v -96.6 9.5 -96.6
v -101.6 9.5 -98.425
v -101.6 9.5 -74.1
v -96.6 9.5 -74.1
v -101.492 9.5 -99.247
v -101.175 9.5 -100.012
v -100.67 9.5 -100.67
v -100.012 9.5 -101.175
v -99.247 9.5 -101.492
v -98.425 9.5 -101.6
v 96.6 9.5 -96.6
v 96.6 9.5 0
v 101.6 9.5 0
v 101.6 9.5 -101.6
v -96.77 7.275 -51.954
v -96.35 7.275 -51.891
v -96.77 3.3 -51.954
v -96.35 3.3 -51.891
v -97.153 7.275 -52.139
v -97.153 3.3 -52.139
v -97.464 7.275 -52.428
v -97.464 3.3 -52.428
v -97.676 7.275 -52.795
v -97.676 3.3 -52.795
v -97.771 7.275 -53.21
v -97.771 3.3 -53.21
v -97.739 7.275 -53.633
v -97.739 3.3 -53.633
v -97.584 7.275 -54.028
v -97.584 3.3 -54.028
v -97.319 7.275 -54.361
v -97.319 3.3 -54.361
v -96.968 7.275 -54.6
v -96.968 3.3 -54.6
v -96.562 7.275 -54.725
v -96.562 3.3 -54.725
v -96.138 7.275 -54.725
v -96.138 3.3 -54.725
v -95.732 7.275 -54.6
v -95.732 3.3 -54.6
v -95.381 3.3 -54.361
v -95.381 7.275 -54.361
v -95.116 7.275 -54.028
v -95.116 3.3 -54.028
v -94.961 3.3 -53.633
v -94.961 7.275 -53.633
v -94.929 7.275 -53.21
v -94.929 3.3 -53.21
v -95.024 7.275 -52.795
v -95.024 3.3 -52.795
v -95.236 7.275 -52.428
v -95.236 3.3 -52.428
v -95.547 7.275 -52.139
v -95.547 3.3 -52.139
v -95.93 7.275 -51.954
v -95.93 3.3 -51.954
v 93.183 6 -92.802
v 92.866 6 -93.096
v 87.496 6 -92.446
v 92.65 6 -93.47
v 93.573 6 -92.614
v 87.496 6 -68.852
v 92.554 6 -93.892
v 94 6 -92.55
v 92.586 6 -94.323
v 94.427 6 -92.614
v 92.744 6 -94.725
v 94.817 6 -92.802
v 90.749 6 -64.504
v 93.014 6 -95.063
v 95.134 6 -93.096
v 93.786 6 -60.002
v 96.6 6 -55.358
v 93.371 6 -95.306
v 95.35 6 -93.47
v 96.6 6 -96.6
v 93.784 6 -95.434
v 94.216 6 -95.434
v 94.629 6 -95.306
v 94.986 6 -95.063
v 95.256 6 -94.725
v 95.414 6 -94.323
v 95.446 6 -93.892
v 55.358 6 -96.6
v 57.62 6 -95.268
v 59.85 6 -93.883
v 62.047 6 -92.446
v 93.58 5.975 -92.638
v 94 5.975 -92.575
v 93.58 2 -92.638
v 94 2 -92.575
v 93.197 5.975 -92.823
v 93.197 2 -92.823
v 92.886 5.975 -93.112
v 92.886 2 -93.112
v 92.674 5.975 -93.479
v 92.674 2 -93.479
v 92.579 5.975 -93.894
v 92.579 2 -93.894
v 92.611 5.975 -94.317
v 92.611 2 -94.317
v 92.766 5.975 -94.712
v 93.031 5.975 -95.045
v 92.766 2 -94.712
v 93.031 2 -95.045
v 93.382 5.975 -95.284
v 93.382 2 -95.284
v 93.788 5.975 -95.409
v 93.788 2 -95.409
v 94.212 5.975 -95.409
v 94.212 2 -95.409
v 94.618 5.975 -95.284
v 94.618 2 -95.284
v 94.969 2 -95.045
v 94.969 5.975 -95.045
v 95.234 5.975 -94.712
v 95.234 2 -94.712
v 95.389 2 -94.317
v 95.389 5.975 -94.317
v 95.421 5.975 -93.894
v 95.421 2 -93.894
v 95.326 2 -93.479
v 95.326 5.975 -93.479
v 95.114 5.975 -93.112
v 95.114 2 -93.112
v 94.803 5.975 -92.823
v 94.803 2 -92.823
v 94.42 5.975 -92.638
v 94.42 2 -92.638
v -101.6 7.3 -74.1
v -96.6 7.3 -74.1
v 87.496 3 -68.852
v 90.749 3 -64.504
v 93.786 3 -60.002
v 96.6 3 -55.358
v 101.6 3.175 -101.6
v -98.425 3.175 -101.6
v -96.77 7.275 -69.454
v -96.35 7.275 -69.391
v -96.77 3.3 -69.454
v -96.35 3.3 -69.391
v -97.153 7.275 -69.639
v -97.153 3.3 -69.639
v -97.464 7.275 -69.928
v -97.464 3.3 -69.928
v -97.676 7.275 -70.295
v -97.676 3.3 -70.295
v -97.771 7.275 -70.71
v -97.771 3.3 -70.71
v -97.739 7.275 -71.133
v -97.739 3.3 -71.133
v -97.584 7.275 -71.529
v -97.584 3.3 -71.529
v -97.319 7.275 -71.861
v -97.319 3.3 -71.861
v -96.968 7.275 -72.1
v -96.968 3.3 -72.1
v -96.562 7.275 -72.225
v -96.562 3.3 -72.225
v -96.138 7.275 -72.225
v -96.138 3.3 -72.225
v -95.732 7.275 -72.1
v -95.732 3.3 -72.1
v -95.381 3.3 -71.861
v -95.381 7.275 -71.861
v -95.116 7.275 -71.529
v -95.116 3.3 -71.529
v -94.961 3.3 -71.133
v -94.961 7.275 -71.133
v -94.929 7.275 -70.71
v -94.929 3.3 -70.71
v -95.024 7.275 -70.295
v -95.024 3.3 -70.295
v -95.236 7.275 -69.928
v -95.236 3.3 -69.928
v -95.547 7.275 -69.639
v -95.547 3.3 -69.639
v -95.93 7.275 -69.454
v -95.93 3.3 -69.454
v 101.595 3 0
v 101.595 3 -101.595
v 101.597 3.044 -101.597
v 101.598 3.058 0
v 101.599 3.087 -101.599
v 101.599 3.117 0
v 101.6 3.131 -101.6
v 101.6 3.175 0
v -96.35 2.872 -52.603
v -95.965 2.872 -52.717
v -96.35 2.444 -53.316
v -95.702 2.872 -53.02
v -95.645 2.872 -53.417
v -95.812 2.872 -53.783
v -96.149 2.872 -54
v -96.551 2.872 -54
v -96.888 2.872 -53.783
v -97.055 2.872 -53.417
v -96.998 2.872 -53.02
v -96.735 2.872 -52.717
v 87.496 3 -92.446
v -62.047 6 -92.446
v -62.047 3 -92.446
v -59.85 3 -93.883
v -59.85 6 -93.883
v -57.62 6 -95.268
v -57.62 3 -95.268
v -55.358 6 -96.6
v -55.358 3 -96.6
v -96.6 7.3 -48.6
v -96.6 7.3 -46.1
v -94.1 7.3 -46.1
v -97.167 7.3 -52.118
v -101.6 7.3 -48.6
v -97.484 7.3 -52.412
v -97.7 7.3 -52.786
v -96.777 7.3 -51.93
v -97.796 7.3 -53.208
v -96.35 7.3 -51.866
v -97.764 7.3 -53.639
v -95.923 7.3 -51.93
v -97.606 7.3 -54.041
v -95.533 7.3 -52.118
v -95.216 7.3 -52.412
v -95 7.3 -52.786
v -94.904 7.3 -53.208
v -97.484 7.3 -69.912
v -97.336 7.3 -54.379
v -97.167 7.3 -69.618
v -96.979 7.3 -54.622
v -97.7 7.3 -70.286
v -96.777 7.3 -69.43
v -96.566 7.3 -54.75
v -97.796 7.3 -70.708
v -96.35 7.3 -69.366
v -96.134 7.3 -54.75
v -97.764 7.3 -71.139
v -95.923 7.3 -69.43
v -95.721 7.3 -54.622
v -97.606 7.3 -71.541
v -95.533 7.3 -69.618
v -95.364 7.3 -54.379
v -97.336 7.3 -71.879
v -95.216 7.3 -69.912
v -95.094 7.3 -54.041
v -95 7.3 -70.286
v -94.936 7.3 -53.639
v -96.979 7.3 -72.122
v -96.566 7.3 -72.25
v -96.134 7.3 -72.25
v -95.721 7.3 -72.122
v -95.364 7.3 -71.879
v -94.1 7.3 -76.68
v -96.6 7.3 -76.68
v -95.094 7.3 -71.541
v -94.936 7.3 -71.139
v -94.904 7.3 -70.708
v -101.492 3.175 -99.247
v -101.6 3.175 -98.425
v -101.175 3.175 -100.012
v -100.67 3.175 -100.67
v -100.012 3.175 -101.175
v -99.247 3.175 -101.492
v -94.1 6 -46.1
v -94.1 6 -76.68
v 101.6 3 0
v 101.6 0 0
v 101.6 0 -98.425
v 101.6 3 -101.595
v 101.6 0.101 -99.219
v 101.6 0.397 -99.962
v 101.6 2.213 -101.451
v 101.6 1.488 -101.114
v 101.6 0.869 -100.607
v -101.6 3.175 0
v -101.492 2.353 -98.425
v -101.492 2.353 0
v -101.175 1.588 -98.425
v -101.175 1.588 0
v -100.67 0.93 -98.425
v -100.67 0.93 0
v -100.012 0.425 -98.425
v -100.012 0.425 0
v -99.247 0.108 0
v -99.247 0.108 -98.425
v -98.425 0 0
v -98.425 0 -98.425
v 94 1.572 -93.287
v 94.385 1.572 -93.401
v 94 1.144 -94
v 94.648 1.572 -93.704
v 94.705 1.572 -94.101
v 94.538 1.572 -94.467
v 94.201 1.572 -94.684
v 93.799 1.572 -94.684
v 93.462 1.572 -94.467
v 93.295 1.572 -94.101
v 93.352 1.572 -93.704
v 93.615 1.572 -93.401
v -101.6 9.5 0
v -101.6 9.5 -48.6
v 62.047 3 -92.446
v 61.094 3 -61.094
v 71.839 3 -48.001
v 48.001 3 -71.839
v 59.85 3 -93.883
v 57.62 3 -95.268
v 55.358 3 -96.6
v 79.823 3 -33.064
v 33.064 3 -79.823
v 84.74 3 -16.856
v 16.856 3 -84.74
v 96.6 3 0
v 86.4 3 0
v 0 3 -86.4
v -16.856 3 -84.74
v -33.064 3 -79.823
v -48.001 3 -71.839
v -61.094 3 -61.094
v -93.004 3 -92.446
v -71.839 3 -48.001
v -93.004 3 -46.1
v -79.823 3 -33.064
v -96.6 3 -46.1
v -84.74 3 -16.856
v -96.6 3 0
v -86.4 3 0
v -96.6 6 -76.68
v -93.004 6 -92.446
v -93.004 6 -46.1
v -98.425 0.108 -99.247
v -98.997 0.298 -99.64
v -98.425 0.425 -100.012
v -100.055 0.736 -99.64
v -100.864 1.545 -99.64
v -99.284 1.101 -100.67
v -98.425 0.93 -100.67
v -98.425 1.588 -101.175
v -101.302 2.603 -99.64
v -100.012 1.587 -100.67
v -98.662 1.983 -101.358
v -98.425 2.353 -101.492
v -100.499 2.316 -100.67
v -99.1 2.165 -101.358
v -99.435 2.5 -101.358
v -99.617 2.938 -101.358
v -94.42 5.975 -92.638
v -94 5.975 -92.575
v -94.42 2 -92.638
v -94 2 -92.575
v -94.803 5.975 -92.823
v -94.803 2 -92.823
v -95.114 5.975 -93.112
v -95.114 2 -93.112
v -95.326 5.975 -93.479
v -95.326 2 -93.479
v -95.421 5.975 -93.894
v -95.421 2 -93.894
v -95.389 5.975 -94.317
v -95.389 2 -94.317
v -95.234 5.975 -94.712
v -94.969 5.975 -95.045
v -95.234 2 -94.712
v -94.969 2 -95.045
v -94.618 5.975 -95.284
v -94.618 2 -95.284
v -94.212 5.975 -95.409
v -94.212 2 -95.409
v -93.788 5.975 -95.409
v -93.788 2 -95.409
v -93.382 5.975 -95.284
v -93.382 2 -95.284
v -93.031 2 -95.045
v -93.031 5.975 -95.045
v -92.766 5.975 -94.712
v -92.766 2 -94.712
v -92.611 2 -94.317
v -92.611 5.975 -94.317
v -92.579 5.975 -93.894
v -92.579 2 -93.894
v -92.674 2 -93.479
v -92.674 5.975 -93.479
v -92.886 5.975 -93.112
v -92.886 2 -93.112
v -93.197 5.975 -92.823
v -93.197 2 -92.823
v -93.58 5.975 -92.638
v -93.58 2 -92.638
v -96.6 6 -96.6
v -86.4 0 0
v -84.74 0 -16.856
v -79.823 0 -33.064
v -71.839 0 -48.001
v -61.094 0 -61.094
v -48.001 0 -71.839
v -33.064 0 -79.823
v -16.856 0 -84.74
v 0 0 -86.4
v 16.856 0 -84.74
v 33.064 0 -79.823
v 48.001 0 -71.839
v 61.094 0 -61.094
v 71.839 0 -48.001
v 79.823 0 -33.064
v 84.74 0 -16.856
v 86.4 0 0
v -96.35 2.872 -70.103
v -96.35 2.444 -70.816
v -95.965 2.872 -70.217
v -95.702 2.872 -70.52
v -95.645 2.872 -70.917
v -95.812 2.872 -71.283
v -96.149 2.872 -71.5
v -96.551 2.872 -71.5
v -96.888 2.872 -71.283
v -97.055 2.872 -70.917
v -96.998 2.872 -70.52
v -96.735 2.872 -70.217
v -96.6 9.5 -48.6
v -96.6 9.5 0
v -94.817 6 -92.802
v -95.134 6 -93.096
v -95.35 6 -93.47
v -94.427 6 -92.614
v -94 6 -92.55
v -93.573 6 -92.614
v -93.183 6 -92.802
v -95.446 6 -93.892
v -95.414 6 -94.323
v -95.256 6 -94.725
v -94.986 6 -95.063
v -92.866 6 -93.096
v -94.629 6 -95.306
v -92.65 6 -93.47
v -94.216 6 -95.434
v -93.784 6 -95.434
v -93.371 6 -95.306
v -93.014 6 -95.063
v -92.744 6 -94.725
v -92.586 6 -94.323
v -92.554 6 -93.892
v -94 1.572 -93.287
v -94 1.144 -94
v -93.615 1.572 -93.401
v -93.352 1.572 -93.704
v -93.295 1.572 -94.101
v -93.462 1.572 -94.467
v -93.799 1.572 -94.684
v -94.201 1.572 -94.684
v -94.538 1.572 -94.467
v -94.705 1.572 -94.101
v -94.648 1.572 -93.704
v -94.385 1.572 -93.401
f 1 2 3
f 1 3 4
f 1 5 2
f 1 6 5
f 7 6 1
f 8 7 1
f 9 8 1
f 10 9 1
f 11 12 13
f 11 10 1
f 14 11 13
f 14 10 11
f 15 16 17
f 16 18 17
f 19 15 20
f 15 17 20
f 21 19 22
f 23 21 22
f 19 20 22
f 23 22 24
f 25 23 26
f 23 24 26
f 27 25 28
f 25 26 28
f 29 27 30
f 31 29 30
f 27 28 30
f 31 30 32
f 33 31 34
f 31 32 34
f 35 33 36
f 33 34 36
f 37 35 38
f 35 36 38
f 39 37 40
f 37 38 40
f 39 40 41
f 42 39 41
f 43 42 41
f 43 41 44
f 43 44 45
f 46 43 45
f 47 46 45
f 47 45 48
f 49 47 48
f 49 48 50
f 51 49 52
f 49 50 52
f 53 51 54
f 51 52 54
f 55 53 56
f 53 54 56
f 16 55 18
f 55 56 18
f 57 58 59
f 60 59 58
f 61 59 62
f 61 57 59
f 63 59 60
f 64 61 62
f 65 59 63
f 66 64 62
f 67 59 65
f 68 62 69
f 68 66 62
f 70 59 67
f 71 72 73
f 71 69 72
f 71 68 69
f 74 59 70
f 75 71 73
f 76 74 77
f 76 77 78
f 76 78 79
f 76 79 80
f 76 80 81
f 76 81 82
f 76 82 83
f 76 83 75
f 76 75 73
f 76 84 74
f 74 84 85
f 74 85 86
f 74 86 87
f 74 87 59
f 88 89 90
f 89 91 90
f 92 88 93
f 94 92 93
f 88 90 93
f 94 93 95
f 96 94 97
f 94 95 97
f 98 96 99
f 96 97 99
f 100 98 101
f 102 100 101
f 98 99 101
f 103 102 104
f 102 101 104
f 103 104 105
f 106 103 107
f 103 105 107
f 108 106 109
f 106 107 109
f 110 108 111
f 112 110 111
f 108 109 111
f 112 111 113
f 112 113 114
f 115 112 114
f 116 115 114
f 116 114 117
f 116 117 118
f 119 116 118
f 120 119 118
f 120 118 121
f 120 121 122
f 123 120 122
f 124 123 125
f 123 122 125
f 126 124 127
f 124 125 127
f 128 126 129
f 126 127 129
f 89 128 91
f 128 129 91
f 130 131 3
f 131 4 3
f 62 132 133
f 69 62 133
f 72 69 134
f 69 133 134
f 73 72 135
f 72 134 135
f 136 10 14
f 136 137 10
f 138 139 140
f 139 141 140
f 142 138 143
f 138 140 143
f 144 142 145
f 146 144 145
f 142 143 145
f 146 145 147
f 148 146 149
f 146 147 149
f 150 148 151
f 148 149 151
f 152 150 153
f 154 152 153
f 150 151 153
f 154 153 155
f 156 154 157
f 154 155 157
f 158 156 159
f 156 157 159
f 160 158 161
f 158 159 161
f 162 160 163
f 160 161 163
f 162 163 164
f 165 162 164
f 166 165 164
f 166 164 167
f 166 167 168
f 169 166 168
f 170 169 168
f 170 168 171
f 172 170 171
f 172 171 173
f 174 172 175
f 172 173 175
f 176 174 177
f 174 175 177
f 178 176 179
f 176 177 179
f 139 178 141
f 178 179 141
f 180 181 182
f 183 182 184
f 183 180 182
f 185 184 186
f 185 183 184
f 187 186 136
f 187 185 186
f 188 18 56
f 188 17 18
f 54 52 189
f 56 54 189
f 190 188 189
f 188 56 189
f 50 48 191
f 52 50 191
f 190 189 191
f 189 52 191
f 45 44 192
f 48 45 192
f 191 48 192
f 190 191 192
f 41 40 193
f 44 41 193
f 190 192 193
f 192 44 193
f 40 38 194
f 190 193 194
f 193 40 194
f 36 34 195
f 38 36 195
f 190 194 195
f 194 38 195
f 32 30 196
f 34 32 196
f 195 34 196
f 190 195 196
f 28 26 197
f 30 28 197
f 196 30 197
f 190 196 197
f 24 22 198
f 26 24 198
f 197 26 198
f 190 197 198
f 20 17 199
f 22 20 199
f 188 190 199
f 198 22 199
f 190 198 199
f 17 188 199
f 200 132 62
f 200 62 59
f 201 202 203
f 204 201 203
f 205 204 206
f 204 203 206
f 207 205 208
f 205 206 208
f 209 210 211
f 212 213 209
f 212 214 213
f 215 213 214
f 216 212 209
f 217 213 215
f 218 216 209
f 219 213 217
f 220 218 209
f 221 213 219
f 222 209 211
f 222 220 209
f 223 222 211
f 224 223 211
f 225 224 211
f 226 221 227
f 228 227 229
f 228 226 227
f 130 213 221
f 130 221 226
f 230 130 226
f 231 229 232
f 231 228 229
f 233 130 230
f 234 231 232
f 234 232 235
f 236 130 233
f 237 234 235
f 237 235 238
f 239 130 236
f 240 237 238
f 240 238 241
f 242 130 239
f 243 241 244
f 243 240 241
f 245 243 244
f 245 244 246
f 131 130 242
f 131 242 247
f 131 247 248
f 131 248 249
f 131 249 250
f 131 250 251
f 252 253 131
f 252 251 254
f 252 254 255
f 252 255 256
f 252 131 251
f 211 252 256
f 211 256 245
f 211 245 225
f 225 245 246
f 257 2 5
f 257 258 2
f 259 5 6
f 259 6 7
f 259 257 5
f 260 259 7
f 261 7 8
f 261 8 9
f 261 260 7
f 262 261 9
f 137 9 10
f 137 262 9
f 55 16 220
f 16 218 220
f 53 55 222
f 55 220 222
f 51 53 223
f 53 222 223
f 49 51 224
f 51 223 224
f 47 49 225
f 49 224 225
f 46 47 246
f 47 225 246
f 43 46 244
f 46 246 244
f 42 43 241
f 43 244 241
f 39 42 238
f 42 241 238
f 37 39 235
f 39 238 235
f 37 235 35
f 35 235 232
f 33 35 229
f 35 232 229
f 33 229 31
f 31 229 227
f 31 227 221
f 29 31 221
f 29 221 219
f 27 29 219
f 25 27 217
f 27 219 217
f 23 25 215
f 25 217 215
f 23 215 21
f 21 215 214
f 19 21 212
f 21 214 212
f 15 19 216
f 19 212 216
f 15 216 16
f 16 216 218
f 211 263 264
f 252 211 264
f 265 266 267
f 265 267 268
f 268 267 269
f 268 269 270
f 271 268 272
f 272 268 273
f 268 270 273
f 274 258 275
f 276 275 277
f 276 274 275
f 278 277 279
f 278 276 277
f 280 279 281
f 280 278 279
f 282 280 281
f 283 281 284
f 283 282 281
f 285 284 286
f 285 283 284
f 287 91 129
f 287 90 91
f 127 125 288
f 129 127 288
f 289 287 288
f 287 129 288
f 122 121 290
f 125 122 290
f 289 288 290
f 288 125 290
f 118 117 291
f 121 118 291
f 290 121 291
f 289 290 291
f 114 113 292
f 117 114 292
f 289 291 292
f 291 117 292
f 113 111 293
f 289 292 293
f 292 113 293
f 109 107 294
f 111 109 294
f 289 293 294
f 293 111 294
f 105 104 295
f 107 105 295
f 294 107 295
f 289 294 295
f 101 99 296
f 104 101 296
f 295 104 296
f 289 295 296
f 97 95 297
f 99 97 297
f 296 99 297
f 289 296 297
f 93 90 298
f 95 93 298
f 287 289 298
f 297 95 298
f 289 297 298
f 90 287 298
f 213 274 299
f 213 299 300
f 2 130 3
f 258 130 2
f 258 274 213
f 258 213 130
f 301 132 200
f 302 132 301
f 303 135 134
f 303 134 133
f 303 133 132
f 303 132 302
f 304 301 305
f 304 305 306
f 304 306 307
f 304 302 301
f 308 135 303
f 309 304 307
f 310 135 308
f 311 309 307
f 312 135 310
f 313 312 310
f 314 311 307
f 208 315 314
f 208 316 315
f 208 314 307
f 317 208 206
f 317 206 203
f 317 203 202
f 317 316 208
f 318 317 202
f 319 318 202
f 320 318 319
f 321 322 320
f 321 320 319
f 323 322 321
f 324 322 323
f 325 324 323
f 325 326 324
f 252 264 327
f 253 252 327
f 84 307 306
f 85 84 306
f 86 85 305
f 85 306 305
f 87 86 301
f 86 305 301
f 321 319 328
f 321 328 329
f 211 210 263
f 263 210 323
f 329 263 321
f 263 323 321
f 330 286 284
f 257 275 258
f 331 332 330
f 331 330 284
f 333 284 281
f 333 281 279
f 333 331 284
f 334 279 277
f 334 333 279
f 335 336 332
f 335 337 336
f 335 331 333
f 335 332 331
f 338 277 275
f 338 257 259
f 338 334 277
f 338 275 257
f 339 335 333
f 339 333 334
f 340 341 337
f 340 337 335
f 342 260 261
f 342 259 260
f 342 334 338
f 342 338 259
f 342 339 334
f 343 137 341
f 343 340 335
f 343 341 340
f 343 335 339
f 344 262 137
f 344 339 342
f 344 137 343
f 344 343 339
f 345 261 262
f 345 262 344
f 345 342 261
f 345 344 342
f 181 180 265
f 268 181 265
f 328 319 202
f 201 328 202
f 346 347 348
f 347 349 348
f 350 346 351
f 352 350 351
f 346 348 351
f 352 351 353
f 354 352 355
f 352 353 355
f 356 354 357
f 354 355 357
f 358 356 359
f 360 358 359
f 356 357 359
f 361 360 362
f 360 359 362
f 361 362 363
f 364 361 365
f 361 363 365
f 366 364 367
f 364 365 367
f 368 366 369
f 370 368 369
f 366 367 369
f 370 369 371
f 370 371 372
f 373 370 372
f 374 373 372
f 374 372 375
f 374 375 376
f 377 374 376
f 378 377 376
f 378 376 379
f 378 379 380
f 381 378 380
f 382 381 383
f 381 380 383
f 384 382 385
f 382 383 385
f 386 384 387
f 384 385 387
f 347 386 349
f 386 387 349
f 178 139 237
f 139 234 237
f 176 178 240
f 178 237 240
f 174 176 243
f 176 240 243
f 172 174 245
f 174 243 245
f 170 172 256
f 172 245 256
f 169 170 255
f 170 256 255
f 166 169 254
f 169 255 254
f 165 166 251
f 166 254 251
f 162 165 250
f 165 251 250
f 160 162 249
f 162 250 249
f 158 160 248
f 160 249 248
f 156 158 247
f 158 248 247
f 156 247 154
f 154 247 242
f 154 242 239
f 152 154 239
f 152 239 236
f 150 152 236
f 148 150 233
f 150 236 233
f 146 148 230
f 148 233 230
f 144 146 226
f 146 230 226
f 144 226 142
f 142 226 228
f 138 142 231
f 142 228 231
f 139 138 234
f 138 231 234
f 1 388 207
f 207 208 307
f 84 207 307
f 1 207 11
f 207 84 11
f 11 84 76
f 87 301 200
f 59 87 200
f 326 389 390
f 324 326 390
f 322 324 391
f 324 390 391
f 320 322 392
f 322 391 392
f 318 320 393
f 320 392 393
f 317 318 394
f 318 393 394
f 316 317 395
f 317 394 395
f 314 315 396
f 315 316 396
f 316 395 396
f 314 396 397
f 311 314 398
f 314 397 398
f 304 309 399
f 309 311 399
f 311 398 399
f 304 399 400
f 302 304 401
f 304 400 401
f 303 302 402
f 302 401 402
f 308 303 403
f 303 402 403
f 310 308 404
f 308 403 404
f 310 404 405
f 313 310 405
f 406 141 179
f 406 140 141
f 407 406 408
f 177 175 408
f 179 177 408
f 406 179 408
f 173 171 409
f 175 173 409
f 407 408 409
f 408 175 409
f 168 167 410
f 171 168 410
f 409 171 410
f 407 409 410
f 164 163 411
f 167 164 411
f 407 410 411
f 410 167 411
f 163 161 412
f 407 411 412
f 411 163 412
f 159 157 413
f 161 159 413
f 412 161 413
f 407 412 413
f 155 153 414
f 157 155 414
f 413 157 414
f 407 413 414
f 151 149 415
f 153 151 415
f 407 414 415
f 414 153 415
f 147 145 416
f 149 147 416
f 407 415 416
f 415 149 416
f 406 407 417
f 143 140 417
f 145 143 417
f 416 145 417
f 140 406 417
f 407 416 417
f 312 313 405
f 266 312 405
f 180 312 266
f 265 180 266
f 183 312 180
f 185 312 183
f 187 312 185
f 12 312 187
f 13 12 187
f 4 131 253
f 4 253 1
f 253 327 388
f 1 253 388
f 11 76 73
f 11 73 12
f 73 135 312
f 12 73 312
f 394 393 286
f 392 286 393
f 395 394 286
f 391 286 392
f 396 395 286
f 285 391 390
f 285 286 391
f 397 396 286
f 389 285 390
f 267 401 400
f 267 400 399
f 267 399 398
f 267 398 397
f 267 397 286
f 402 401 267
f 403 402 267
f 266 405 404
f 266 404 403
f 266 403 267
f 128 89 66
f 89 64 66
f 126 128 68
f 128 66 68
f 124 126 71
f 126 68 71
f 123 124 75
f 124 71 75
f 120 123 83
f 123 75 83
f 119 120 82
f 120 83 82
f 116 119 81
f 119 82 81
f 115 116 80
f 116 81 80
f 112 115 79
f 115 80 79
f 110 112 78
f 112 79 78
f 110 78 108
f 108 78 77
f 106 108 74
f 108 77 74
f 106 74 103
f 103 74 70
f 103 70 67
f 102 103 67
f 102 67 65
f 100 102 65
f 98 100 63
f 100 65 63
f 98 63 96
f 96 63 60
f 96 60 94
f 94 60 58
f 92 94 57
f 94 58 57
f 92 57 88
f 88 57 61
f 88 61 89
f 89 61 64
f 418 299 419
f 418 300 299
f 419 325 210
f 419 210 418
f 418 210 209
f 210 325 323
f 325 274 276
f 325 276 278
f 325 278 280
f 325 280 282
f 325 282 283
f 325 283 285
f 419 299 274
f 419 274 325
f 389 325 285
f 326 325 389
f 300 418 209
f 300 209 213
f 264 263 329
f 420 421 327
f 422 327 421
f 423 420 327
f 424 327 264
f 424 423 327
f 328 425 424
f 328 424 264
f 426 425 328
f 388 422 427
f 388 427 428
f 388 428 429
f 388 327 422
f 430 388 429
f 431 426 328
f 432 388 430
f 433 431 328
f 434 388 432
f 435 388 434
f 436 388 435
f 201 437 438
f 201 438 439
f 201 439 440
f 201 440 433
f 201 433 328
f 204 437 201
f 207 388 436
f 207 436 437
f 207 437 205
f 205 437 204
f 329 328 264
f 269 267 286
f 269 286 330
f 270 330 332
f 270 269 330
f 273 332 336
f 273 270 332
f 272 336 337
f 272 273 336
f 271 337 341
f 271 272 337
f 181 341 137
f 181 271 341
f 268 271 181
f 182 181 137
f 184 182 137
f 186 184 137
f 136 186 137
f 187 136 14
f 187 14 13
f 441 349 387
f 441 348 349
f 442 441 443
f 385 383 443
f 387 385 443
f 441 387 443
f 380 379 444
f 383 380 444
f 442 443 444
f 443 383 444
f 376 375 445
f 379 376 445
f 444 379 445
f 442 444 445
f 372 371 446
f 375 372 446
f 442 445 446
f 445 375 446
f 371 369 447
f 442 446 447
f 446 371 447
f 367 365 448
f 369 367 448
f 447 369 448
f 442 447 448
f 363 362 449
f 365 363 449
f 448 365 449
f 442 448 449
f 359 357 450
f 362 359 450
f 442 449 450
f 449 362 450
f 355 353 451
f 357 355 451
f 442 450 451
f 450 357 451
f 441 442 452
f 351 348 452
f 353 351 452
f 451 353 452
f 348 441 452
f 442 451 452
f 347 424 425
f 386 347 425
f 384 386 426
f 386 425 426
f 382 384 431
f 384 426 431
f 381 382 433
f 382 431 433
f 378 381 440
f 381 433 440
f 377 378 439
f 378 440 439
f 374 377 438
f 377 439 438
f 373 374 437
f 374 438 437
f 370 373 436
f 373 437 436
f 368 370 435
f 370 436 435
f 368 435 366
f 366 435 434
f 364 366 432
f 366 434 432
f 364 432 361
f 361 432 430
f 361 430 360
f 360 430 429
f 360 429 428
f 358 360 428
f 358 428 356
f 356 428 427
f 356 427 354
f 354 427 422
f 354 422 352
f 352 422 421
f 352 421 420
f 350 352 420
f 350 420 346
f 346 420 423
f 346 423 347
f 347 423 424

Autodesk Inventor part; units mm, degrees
ref_plane "YZ Plane" through (0, 0, 0) normal (1, 0, 0) x (0, 1, 0)
ref_plane "XZ Plane" through (0, 0, 0) normal (0, 1, 0) x (-1, 0, 0)
ref_plane "XY Plane" through (0, 0, 0) normal (0, 0, 1) x (1, 0, 0)
sketch "Sketch1" plane through (0, 0, 0) normal (0, 1, 0) x (-1, 0, 0)
  line L0 (101.6, -101.6) -> (-101.6, -101.6)
  line L1 (-101.6, -101.6) -> (-101.6, 101.6)
  line L2 (-101.6, 101.6) -> (101.6, 101.6)
  line L3 (101.6, 101.6) -> (101.6, -101.6)
  line L4 (96.6, -96.6) -> (-96.6, -96.6)
  line L5 (-96.6, -96.6) -> (-96.6, 96.6)
  line L6 (-96.6, 96.6) -> (96.6, 96.6)
  line L7 (96.6, 96.6) -> (96.6, -96.6)
  line L8 (101.6, 101.6) -> (-40.4, 101.6)
  circle A0 centre (0, 0) radius 86.4
  circle A1 centre (0, 0) radius 109.3376
  line L9 (-40.4, 101.6) -> (-101.6, 40.4)
  line L10 (-45.4, 101.6) -> (-101.6, 45.4)
  line L11 (96.6, 96.6) -> (96.6, 101.6)
  line L12 (-45.4, 101.6) -> (-35.4, 101.6)
  line L13 (-35.4, 101.6) -> (-35.4, 96.6)
  line L14 (-35.4, 96.6) -> (-45.4, 96.6)
  line L15 (-45.4, 96.6) -> (-45.4, 101.6)
  circle A2 centre (0, 0) radius 111.3376
  point P0 (96.6, 51.2168)
  point P1 (101.6, 40.4)
  point P2 (101.6, -40.4)
  point P3 (96.6, -51.2168)
  point P4 (-96.6, 45.4)
  point P5 (-45.4, 96.6)
  dimension "d0" = 203.2
  dimension "d1" = 203.2
  dimension "d2" = 101.6
  dimension "d3" = 101.6
  dimension "d4" = 5
  dimension "d5" = 5
  dimension "d6" = 5
  dimension "d7" = 5
  dimension "d10" = 142
  dimension "d12" = 61.2
  dimension "d14" = 172.8
  dimension "d15" = 5
  dimension "d16" = 5
  dimension "d17" = 10
  dimension "d34" = 2
extrude "Extrusion1" add sketch "Sketch1" along normal blind 3 contours L0 A2 L4 L7 L3 | L0 A1 L4 A2 | A2 L7 A1 L3 | L0 A1 L4 | A2 L4 A1 L0 | L0 L1 A2 L5 L4 | A2 L7 L4 | L4 A1 L7 A2 | A1 L7 L3 | L4 A1 L5 L9 L6 L7 | A2 L5 A1 L4 | L4 L5 A2 | A1 L7 A2 L3 | A2 L7 L11 L2 L3 | L1 A1 L5 A2 | A1 L6 A2 L7 | A2 L6 L7 | A1 L1 L9 L5 | A1 L2 A2 L6 | L6 L13 L2 A1 | L11 L6 A2 L2 | L9 A1 L10 L5 | L5 L10 L6 L9 | L1 L10 A1 | L6 L9 L2 L13 | L15 A1 L9 | L6 L10 A1 L15 | A1 L15 L2 | A1 L10 L15
sketch "Sketch5" plane through (0, 3, 0) normal (0, 1, 0) x (1, 0, 0)
  line L0 (-101.6, 101.6) -> (101.6, 101.6)
  line L1 (101.6, 101.6) -> (101.6, -101.6)
  line L2 (101.6, -101.6) -> (-101.6, -101.6)
  line L3 (-101.6, -101.6) -> (-101.6, 101.6)
  line L4 (-96.6, 96.6) -> (96.6, 96.6)
  line L5 (96.6, 96.6) -> (96.6, -96.6)
  line L6 (96.6, -96.6) -> (-96.6, -96.6)
  line L7 (-96.6, -96.6) -> (-96.6, 96.6)
  line L8 (-101.6, -101.6) -> (40.4, -101.6)
  circle A0 centre (0, 0) radius 88.9
  circle A1 centre (0, 0) radius 109.3376
  line L9 (40.4, -101.6) -> (101.6, -40.4)
  line L10 (45.4, -101.6) -> (101.6, -45.4)
  line L11 (-96.6, -96.6) -> (-96.6, -101.6)
  line L12 (45.4, -101.6) -> (35.4, -101.6)
  line L13 (35.4, -101.6) -> (35.4, -96.6)
  line L14 (35.4, -96.6) -> (45.4, -96.6)
  line L15 (45.4, -96.6) -> (45.4, -101.6)
  circle A2 centre (0, 0) radius 111.3376
  point P0 (96.6, 101.6)
  point P1 (96.6, 51.2168)
  point P2 (101.6, 40.4)
  point P3 (101.6, -40.4)
  point P4 (96.6, -51.2168)
  point P5 (-96.6, 45.4)
  point P6 (-45.4, 96.6)
  point P7 (-35.4, 101.6)
  point P8 (-55.358, -96.6)
  point P9 (-96.6, -55.358)
  point P10 (-96.6, 55.358)
  point P11 (-55.358, 96.6)
  point P12 (55.358, 96.6)
  point P13 (96.6, 55.358)
  point P14 (96.6, -45.4)
  point P15 (45.4, -96.6)
  dimension "d37" = 203.2
  dimension "d38" = 203.2
  dimension "d39" = 101.6
  dimension "d40" = 101.6
  dimension "d41" = 5
  dimension "d42" = 5
  dimension "d43" = 5
  dimension "d44" = 5
  dimension "d45" = 142
  dimension "d46" = 61.2
  dimension "d47" = 177.8
  dimension "d48" = 5
  dimension "d49" = 5
  dimension "d50" = 10
  dimension "d51" = 2
extrude "Extrusion4" add sketch "Sketch5" along normal blind 3 contours L0 A2 L4 L7 L3 | L0 A1 L4 A2 | A2 L7 A1 L3 | L0 A1 L4 | A2 L4 A1 L0 | L0 L1 A2 L5 L4 | A2 L7 L4 | A1 L7 L3 | A2 L7 L11 L2 L3 | L3 A1 L7 A2 | L4 L5 A2 | A2 L6 L7 | L1 A1 L5 A2 | L11 L6 A2 L2 | L6 A1 L2 A2 | A1 L1 L9 L5 | L6 L13 L2 A1 | L9 A1 L10 L5 | L5 L10 L6 L9 | L1 L10 A1 | L6 L9 L2 L13 | L15 A1 L9 | L6 L10 A1 L15 | A1 L15 L2 | L15 A1 L10
sketch "Sketch6" plane through (0, 6, 0) normal (0, 1, 0) x (1, 0, 0)
  line L0 (-101.6, 101.6) -> (101.6, 101.6)
  line L1 (101.6, 101.6) -> (101.6, -101.6)
  line L2 (101.6, -101.6) -> (-101.6, -101.6)
  line L3 (-101.6, -101.6) -> (-101.6, 101.6)
  line L4 (-96.6, 96.6) -> (96.6, 96.6)
  line L5 (96.6, 96.6) -> (96.6, -96.6)
  line L6 (96.6, -96.6) -> (-96.6, -96.6)
  line L7 (-96.6, -96.6) -> (-96.6, 96.6)
  line L8 (-101.6, -101.6) -> (40.4, -101.6)
  circle A0 centre (0, 0) radius 88.9
  circle A1 centre (0, 0) radius 109.3376
  line L9 (40.4, -101.6) -> (101.6, -40.4)
  line L10 (45.4, -101.6) -> (101.6, -45.4)
  line L11 (-96.6, -96.6) -> (-96.6, -101.6)
  line L12 (45.4, -101.6) -> (35.4, -101.6)
  line L13 (35.4, -101.6) -> (35.4, -96.6)
  line L14 (35.4, -96.6) -> (45.4, -96.6)
  line L15 (45.4, -96.6) -> (45.4, -101.6)
  circle A2 centre (0, 0) radius 111.3376
  point P0 (96.6, 101.6)
  point P1 (96.6, 51.2168)
  point P2 (101.6, 40.4)
  point P3 (101.6, -40.4)
  point P4 (96.6, -51.2168)
  point P5 (-96.6, 45.4)
  point P6 (-45.4, 96.6)
  point P7 (-35.4, 101.6)
  point P8 (55.358, 96.6)
  point P9 (96.6, 55.358)
  point P10 (96.6, -45.4)
  point P11 (45.4, -96.6)
  dimension "d84" = 1
  dimension "d85" = 5.25
  dimension "d86" = 8.75
  dimension "d87" = 8.75
  dimension "d88" = 2
  dimension "d89" = 2
  dimension "d54" = 203.2
  dimension "d55" = 203.2
  dimension "d56" = 101.6
  dimension "d57" = 101.6
  dimension "d58" = 5
  dimension "d59" = 5
  dimension "d60" = 5
  dimension "d61" = 5
  dimension "d62" = 142
  dimension "d63" = 61.2
  dimension "d64" = 177.8
  dimension "d65" = 5
  dimension "d66" = 5
  dimension "d67" = 10
  dimension "d68" = 2
extrude "Extrusion5" add sketch "Sketch6" along normal blind 3.5 contours L0 A2 L4 L7 L3 | L0 A1 L4 A2 | A2 L7 A1 L3 | L0 A1 L4 | A2 L4 A1 L0 | L0 L1 A2 L5 L4 | A1 L7 L3 | A2 L7 L11 L2 L3 | L3 A1 L7 A2 | L1 A1 L5 A2 | L11 L6 A2 L2 | L6 A1 L2 A2 | A1 L1 L9 L5 | L6 L13 L2 A1 | L9 A1 L10 L5 | L5 L10 L6 L9 | L1 L10 A1 | L6 L9 L2 L13 | L15 A1 L9 | L6 L10 A1 L15 | A1 L15 L2 | L15 A1 L10
fillet "Fillet6" radius 3.175 5 edges at (-28.1, 0, 101.6) (73.5, 0, 73.5) (101.6, 0, -28.1) (0, 0, -101.6) (-101.6, 0, 0)
sketch "Sketch7" plane through (0, 0, 0) normal (0, -1, 0) x (1, 0, 0)
  line L0 (101.6, 45.4) -> (101.6, -101.6) projected
  line L1 (98.425, 44.0849) -> (98.425, -98.425) projected
  line L2 (101.6, -101.6) -> (98.425, -101.6)
  line L3 (98.425, -101.6) -> (98.425, 39.0849)
  line L4 (98.425, 39.0849) -> (101.6, 39.0849)
  line L5 (101.6, 39.0849) -> (101.6, -101.6)
  line L6 (44.0849, 98.425) -> (98.425, 44.0849) projected
  line L7 (98.425, 44.0849) -> (101.6, 44.0849)
  point P0 (0, 0)
  dimension "d73" = 5
extrude "Extrusion6" add sketch "Sketch7" against normal blind 3 contours L0 L2 L3 L1 L4
fillet "Fillet7" radius 3.175 1 edges at (100.0125, 0, -101.6)
fillet "Fillet8" radius 3.175 4 edges at (-100.6701, 0.9299, 100.6701) (-101.6, 6.3375, 101.6) (-100.6701, 0.9299, -100.6701) (-101.6, 6.3375, -101.6)
fillet "Fillet9" radius 3.175 4 edges at (100.6701, 0.9299, 45.0148) (101.6, 6.3375, 45.4) (45.0148, 0.9299, 100.6701) (45.4, 6.3375, 101.6)
sketch "Sketch11" plane through (0, 3, 0) normal (0, 1, 0) x (1, 0, 0)
  arc A0 (-101.6, -98.425) -> (-98.425, -101.6) centre (-98.425, -98.425) ccw
  line L0 (44.0849, 101.6) -> (-98.425, 101.6)
  line L1 (-101.6, 98.425) -> (-101.6, -98.425)
  line L2 (-101.6, -46.1) -> (-101.6, -76.6)
  line L3 (-96.6, -96.6) -> (-96.6, 96.6)
  line L4 (-96.6, -46.1) -> (-96.6, -76.6)
  line L5 (-101.6, -76.6) -> (-96.6, -76.6)
  line L6 (-101.6, -46.1) -> (-96.6, -46.1)
  line L7 (-98.425, -101.6) -> (101.6, -101.6)
  line L8 (0, 0) -> (-101.6, 0)
  line L9 (-101.6, 46.1) -> (-101.6, 76.6)
  line L10 (-96.6, 46.1) -> (-96.6, 76.6)
  line L11 (-101.6, 76.6) -> (-96.6, 76.6)
  line L12 (-101.6, 46.1) -> (-96.6, 46.1)
  line L13 (-96.6, -76.6) -> (-90.1, -76.6)
  line L14 (-90.1, -76.6) -> (-90.1, -46.1)
  line L15 (-90.1, -46.1) -> (-96.6, -46.1)
  line L16 (-96.6, -46.1) -> (-96.6, -76.6)
  line L17 (-96.6, 46.1) -> (-90.1, 46.1)
  line L18 (-90.1, 46.1) -> (-90.1, 76.6)
  line L19 (-90.1, 76.6) -> (-96.6, 76.6)
  line L20 (-96.6, 76.6) -> (-96.6, 46.1)
  point P0 (-98.425, 98.425)
  point P1 (46.1, 101.6)
  point P2 (46.1, 96.6)
  point P3 (76.6, 96.6)
  point P4 (76.6, 101.6)
  point P5 (-46.1, 96.6)
  point P6 (-96.6, -46.1)
  point P7 (-101.6, 46.1)
  point P8 (-96.6, 46.1)
  point P9 (-96.6, 76.6)
  point P10 (-101.6, 76.6)
  point P11 (-96.6, 76.6)
  dimension "d97" = 30.5
  dimension "d98" = 25
  dimension "d99" = 5
  dimension "d100" = 6.5
  dimension "d101" = 6.5
extrude "Extrusion8" add sketch "Sketch11" along normal up to surface (3 mm away) contours L19 L18 L17 L3 | L15 L14 L13 L3
sketch "Sketch8" plane through (0, 9.5, 0) normal (0, 1, 0) x (1, 0, 0)
  arc A0 (-101.6, -98.425) -> (-98.425, -101.6) centre (-98.425, -98.425) ccw
  line L0 (44.0849, 101.6) -> (-98.425, 101.6)
  line L1 (-101.6, 98.425) -> (-101.6, -98.425)
  line L2 (-101.6, -46.1) -> (-101.6, -76.6)
  line L3 (-96.6, -96.6) -> (-96.6, 96.6)
  line L4 (-96.6, -46.1) -> (-96.6, -76.6)
  line L5 (-101.6, -76.6) -> (-96.6, -76.6)
  line L6 (-101.6, -46.1) -> (-96.6, -46.1)
  line L7 (-98.425, -101.6) -> (101.6, -101.6)
  line L8 (0, 0) -> (-101.6, 0)
  line L9 (-101.6, 46.1) -> (-101.6, 76.6)
  line L10 (-96.6, 46.1) -> (-96.6, 76.6)
  line L11 (-101.6, 76.6) -> (-96.6, 76.6)
  line L12 (-101.6, 46.1) -> (-96.6, 46.1)
  line L13 (-96.6, -76.6) -> (-90.1, -76.6)
  line L14 (-90.1, -76.6) -> (-90.1, -46.1)
  line L15 (-90.1, -46.1) -> (-96.6, -46.1)
  line L16 (-96.6, -46.1) -> (-96.6, -76.6)
  line L17 (-96.6, 46.1) -> (-90.1, 46.1)
  line L18 (-90.1, 46.1) -> (-90.1, 76.6)
  line L19 (-90.1, 76.6) -> (-96.6, 76.6)
  line L20 (-96.6, 76.6) -> (-96.6, 46.1)
  line L21 (-96.6, -76.6) -> (-101.6, -76.6)
  line L22 (-101.6, -76.6) -> (-101.6, -74.1)
  line L23 (-101.6, -74.1) -> (-96.6, -74.1)
  line L24 (-96.6, -74.1) -> (-96.6, -76.6)
  line L25 (-96.6, -96.6) -> (-96.6, 96.6) projected
  line L26 (-101.6, -46.1) -> (-96.6, -46.1)
  line L27 (-96.6, -46.1) -> (-96.6, -48.6)
  line L28 (-96.6, -48.6) -> (-101.6, -48.6)
  line L29 (-101.6, -48.6) -> (-101.6, -46.1)
  line L30 (-101.6, 76.6) -> (-96.6, 76.6)
  line L31 (-96.6, 76.6) -> (-96.6, 74.1)
  line L32 (-96.6, 74.1) -> (-101.6, 74.1)
  line L33 (-101.6, 74.1) -> (-101.6, 76.6)
  line L34 (-101.6, 46.1) -> (-96.6, 46.1)
  line L35 (-96.6, 46.1) -> (-96.6, 48.6)
  line L36 (-96.6, 48.6) -> (-101.6, 48.6)
  line L37 (-101.6, 48.6) -> (-101.6, 46.1)
  point P0 (-98.425, 98.425)
  point P1 (46.1, 101.6)
  point P2 (46.1, 96.6)
  point P3 (76.6, 96.6)
  point P4 (76.6, 101.6)
  point P5 (-46.1, 96.6)
  point P6 (-96.6, -46.1)
  point P7 (-101.6, 46.1)
  point P8 (-96.6, 46.1)
  point P9 (-96.6, 76.6)
  point P10 (-101.6, 76.6)
  point P11 (-96.6, 76.6)
  dimension "d77" = 30.5
  dimension "d78" = 25
  dimension "d79" = 5
  dimension "d82" = 6.5
  dimension "d83" = 6.5
  dimension "d169" = 2.5
  dimension "d170" = 2.5
  dimension "d171" = 2.5
  dimension "d172" = 2.5
extrude "Extrusion7" cut sketch "Sketch8" against normal blind 2.2 contours L32 L3 L36 L1 | L28 L3 L23 L1
sketch "Sketch15" plane through (0, 3, 0) normal (0, 1, 0) x (1, 0, 0)
  line L0 (0.1655, 2.1158) -> (-93.0045, 2.1158)
  line L1 (-93.0045, 2.1158) -> (-93.0045, 92.4458)
  line L2 (-93.0045, 92.4458) -> (0.1655, 92.4458)
  line L3 (0.1655, 92.4458) -> (0.1655, 2.1158)
  line L4 (0.1655, 2.1158) -> (-93.0045, 2.1158)
  line L5 (-93.0045, 2.1158) -> (-93.0045, -88.0542)
  line L6 (-93.0045, -88.0542) -> (0.1655, -88.0542)
  line L7 (0.1655, -88.0542) -> (0.1655, 2.1158)
  line L8 (0.1655, -88.0542) -> (87.4955, -88.0542)
  line L9 (87.4955, -88.0542) -> (87.4955, -6.1383)
  line L10 (87.4955, -6.1383) -> (0.1655, -6.1383)
  line L11 (0.1655, -6.1383) -> (0.1655, -88.0542)
  line L12 (87.4955, -6.1383) -> (0.1655, -6.1383)
  line L13 (0.1655, -6.1383) -> (0.1655, 92.4458)
  line L14 (0.1655, 92.4458) -> (87.4955, 92.4458)
  line L15 (87.4955, 92.4458) -> (87.4955, -6.1383)
  line L16 (56.4955, -88.0542) -> (87.4955, -57.0542)
  line L17 (56.4955, -88.0542) -> (100.3361, -88.0542) construction
  point P0 (-90.1, -65.4069)
  dimension "d143" = 93.17
  dimension "d144" = 90.17
  dimension "d147" = 180.5
  dimension "d148" = 45
  dimension "d149" = 149.5
  dimension "d150" = 149.5
  dimension "d151" = 93.17
  dimension "d152" = 98.5841
  dimension "d153" = 180.5
extrude "Extrusion9" cut sketch "Sketch15" along normal blind 4 contours L7 L6 L5 L0 | L0 L1 L2 L3 | L3 L14 L15 L10 L7 | L10 L9 L16 L8 L7
sketch "Sketch16" plane through (0, 9.5, 0) normal (0, 1, 0) x (1, 0, 0)
  line L0 (-92.6321, 91.7869) -> (87.7079, 91.7869)
  line L1 (87.7079, 91.7869) -> (87.7079, -88.5531)
  line L2 (87.7079, -88.5531) -> (-92.6321, -88.5531)
  line L3 (-92.6321, -88.5531) -> (-92.6321, 91.7869)
  line L4 (56.3679, -88.5531) -> (87.7079, -57.2131)
  line L5 (56.3679, -88.5531) -> (100.6893, -88.5531) construction
  dimension "d154" = 180.34
  dimension "d155" = 180.34
  dimension "d156" = 45
  dimension "d157" = 149
  dimension "d158" = 149
  dimension "d159" = 22.1607
sketch "Sketch17" plane through (0, 3, 0) normal (0, 1, 0) x (1, 0, 0)
  line L0 (96.6, -45.4) -> (45.4, -96.6) projected
  line L1 (45.4, -96.6) -> (45.4, -91.6)
  line L2 (56.4955, -88.0542) -> (87.4955, -57.0542) projected
  line L3 (56.4955, -88.0542) -> (52.9497, -91.6)
  line L4 (44.0849, -98.425) -> (98.425, -44.0849) projected
  line L5 (52.9497, -91.6) -> (45.4, -91.6)
  line L6 (87.4955, -57.0542) -> (91.6, -52.9497)
  line L7 (91.6, -52.9497) -> (91.6, -45.4)
  line L8 (91.6, -45.4) -> (96.6, -45.4)
  point P0 (0, 0)
  point P1 (91.6, -50.4)
  point P2 (50.4, -91.6)
  dimension "d160" = 5
  dimension "d161" = 5
extrude "Extrusion10" cut sketch "Sketch17" along normal blind 4 contours L7 L4 L5 L0 | L7 L6 L2 L3 L5 L4
sketch "Sketch19" plane through (0, 6, 0) normal (0, 1, 0) x (1, 0, 0)
  line L0 (-93.0045, 46.1) -> (-96.6, 46.1) projected
  line L1 (-96.6, 46.1) -> (-94.1, 46.1)
  line L2 (-94.1, 46.1) -> (-94.1, 76.6805)
  line L3 (-94.1, 76.6805) -> (-96.6, 76.6805)
  line L4 (-96.6, 76.6805) -> (-96.6, 46.1)
  line L5 (-101.6, -46.1) -> (-96.6, -46.1) projected
  line L6 (-96.6, -46.1) -> (-94.1, -46.1)
  line L7 (-94.1, -46.1) -> (-94.1, -76.6)
  line L8 (-94.1, -76.6) -> (-96.6, -76.6)
  line L9 (-96.6, -76.6) -> (-96.6, -46.1)
  point P0 (0, 0)
  dimension "d165" = 2.5
  dimension "d168" = 2.5
extrude "Extrusion11" add sketch "Sketch19" along normal up to surface (1.3 mm away)
sketch "Sketch12" plane through (0, 6, 0) normal (0, 1, 0) x (1, 0, 0)
  line L0 (-94, 94) -> (94, 94)
  line L1 (94, 94) -> (94, -94)
  line L2 (94, -94) -> (-94, -94)
  line L3 (-94, -94) -> (-94, 94)
  circle A0 centre (-94, 94) radius 1
  circle A1 centre (94, 94) radius 1
  circle A2 centre (-94, -94) radius 1
  circle A3 centre (94, -39.0849) radius 1.5
  point P0 (0, 0)
  dimension "d104" = 94
  dimension "d105" = 94
  dimension "d106" = 94
  dimension "d107" = 94
  dimension "d108" = 2
  dimension "d109" = 2
  dimension "d110" = 2
  dimension "d164" = 3
hole "Assembly Holes" at (-94, 6, 94) at (-94, 6, -94) at (94, 6, -94) at (94, 6, 39.0849) direction (0, -1, 0) diameter 2.85 depth 4 tip angle 118 countersink diameter 2.9 countersink angle 90 thread size "M3.5x0.6" class "6H" standard "ANSI Metric M Profile"
sketch "Sketch10" plane through (0, 7.3, 0) normal (0, 1, 0) x (1, 0, 0)
  line L0 (-90.1, -76.6) -> (-90.1, -46.1)
  line L1 (-101.6, -46.1) -> (-96.6, -46.1)
  line L2 (-90.1, -76.6) -> (-90.1, -46.1)
  line L3 (-90.1, -46.1) -> (-101.6, -46.1)
  line L4 (-101.6, -46.1) -> (-101.6, -76.6)
  line L5 (-101.6, -76.6) -> (-90.1, -76.6)
  line L6 (-96.6, -76.6) -> (-90.1, -76.6)
  line L7 (-91.1, -76.6) -> (-91.1, -46.1)
  line L8 (-91.1, -62.066) -> (-96.35, -62.066)
  line L9 (-96.35, -62.066) -> (-96.35, -70.816)
  line L10 (-96.35, -62.066) -> (-96.35, -53.316)
  circle A0 centre (-96.35, -53.316) radius 1
  circle A1 centre (-96.35, -70.816) radius 1
  line L11 (0, 0) -> (-101.6, 0)
  line L12 (-101.6, 98.425) -> (-101.6, -98.425)
  circle A2 centre (-96.35, 70.816) radius 1
  line L13 (-96.35, 62.066) -> (-96.35, 70.816)
  line L14 (-91.1, 62.066) -> (-96.35, 62.066)
  line L15 (-101.6, 76.6) -> (-90.1, 76.6)
  line L16 (-96.35, 62.066) -> (-96.35, 53.316)
  circle A3 centre (-96.35, 53.316) radius 1
  line L17 (-101.6, 46.1) -> (-96.6, 46.1)
  line L18 (-90.1, 46.1) -> (-101.6, 46.1)
  line L19 (-91.1, 76.6) -> (-91.1, 46.1)
  line L20 (-101.6, 46.1) -> (-101.6, 76.6)
  line L21 (-90.1, 76.6) -> (-90.1, 46.1)
  line L22 (-90.1, 76.6) -> (-90.1, 46.1)
  line L23 (-96.6, 76.6) -> (-90.1, 76.6)
  dimension "d84" = 1
  dimension "d85" = 5.25
  dimension "d86" = 8.75
  dimension "d87" = 8.75
  dimension "d88" = 2
  dimension "d89" = 2
hole "Hinge Holes" at (-96.35, 7.3, -70.816) at (-96.35, 7.3, -53.316) at (-96.35, 7.3, 70.816) at (-96.35, 7.3, 53.316) direction (0, -1, 0) diameter 2.85 depth 4 tip angle 118 countersink diameter 2.9 countersink angle 90 thread size "M3.5x0.6" class "6H" standard "ANSI Metric M Profile"
sketch "Sketch21" plane through (0, 9.5, 0) normal (0, 1, 0) x (1, 0, 0)
  line L0 (-101.6, 48.6) -> (-101.6, -48.6) projected
  line L1 (-101.6, 0) -> (101.6, 0)
  line L2 (101.6, 101.6) -> (101.6, -44.0849) projected
  point P0 (0, 0)
ref_plane "Work Plane1" through (-101.6, 9.5, 0) normal (0, 0, 1) x (1, 0, 0)
sketch "Sketch22" plane through (-101.6, 9.5, 0) normal (0, 0, 1) x (1, 0, 0)
  line L0 (-24.2015, 33.7175) -> (229.9688, 33.7175)
  line L1 (229.9688, 33.7175) -> (229.9688, -38.169)
  line L2 (229.9688, -38.169) -> (-24.2015, -38.169)
  line L3 (-24.2015, -38.169) -> (-24.2015, 33.7175)
  point P0 (101.6, -9.5)
extrude "Extrusion12" cut sketch "Sketch22" along normal through all
equation "\"d1\" = d0"
equation "\"d2\" = 0.5 * d0"
equation "\"d3\" = 0.5 * d0"
equation "\"d38\" = d37"
equation "\"d39\" = 0.5 * d37"
equation "\"d40\" = 0.5 * d37"
properties part number "Box_Walls_2"
